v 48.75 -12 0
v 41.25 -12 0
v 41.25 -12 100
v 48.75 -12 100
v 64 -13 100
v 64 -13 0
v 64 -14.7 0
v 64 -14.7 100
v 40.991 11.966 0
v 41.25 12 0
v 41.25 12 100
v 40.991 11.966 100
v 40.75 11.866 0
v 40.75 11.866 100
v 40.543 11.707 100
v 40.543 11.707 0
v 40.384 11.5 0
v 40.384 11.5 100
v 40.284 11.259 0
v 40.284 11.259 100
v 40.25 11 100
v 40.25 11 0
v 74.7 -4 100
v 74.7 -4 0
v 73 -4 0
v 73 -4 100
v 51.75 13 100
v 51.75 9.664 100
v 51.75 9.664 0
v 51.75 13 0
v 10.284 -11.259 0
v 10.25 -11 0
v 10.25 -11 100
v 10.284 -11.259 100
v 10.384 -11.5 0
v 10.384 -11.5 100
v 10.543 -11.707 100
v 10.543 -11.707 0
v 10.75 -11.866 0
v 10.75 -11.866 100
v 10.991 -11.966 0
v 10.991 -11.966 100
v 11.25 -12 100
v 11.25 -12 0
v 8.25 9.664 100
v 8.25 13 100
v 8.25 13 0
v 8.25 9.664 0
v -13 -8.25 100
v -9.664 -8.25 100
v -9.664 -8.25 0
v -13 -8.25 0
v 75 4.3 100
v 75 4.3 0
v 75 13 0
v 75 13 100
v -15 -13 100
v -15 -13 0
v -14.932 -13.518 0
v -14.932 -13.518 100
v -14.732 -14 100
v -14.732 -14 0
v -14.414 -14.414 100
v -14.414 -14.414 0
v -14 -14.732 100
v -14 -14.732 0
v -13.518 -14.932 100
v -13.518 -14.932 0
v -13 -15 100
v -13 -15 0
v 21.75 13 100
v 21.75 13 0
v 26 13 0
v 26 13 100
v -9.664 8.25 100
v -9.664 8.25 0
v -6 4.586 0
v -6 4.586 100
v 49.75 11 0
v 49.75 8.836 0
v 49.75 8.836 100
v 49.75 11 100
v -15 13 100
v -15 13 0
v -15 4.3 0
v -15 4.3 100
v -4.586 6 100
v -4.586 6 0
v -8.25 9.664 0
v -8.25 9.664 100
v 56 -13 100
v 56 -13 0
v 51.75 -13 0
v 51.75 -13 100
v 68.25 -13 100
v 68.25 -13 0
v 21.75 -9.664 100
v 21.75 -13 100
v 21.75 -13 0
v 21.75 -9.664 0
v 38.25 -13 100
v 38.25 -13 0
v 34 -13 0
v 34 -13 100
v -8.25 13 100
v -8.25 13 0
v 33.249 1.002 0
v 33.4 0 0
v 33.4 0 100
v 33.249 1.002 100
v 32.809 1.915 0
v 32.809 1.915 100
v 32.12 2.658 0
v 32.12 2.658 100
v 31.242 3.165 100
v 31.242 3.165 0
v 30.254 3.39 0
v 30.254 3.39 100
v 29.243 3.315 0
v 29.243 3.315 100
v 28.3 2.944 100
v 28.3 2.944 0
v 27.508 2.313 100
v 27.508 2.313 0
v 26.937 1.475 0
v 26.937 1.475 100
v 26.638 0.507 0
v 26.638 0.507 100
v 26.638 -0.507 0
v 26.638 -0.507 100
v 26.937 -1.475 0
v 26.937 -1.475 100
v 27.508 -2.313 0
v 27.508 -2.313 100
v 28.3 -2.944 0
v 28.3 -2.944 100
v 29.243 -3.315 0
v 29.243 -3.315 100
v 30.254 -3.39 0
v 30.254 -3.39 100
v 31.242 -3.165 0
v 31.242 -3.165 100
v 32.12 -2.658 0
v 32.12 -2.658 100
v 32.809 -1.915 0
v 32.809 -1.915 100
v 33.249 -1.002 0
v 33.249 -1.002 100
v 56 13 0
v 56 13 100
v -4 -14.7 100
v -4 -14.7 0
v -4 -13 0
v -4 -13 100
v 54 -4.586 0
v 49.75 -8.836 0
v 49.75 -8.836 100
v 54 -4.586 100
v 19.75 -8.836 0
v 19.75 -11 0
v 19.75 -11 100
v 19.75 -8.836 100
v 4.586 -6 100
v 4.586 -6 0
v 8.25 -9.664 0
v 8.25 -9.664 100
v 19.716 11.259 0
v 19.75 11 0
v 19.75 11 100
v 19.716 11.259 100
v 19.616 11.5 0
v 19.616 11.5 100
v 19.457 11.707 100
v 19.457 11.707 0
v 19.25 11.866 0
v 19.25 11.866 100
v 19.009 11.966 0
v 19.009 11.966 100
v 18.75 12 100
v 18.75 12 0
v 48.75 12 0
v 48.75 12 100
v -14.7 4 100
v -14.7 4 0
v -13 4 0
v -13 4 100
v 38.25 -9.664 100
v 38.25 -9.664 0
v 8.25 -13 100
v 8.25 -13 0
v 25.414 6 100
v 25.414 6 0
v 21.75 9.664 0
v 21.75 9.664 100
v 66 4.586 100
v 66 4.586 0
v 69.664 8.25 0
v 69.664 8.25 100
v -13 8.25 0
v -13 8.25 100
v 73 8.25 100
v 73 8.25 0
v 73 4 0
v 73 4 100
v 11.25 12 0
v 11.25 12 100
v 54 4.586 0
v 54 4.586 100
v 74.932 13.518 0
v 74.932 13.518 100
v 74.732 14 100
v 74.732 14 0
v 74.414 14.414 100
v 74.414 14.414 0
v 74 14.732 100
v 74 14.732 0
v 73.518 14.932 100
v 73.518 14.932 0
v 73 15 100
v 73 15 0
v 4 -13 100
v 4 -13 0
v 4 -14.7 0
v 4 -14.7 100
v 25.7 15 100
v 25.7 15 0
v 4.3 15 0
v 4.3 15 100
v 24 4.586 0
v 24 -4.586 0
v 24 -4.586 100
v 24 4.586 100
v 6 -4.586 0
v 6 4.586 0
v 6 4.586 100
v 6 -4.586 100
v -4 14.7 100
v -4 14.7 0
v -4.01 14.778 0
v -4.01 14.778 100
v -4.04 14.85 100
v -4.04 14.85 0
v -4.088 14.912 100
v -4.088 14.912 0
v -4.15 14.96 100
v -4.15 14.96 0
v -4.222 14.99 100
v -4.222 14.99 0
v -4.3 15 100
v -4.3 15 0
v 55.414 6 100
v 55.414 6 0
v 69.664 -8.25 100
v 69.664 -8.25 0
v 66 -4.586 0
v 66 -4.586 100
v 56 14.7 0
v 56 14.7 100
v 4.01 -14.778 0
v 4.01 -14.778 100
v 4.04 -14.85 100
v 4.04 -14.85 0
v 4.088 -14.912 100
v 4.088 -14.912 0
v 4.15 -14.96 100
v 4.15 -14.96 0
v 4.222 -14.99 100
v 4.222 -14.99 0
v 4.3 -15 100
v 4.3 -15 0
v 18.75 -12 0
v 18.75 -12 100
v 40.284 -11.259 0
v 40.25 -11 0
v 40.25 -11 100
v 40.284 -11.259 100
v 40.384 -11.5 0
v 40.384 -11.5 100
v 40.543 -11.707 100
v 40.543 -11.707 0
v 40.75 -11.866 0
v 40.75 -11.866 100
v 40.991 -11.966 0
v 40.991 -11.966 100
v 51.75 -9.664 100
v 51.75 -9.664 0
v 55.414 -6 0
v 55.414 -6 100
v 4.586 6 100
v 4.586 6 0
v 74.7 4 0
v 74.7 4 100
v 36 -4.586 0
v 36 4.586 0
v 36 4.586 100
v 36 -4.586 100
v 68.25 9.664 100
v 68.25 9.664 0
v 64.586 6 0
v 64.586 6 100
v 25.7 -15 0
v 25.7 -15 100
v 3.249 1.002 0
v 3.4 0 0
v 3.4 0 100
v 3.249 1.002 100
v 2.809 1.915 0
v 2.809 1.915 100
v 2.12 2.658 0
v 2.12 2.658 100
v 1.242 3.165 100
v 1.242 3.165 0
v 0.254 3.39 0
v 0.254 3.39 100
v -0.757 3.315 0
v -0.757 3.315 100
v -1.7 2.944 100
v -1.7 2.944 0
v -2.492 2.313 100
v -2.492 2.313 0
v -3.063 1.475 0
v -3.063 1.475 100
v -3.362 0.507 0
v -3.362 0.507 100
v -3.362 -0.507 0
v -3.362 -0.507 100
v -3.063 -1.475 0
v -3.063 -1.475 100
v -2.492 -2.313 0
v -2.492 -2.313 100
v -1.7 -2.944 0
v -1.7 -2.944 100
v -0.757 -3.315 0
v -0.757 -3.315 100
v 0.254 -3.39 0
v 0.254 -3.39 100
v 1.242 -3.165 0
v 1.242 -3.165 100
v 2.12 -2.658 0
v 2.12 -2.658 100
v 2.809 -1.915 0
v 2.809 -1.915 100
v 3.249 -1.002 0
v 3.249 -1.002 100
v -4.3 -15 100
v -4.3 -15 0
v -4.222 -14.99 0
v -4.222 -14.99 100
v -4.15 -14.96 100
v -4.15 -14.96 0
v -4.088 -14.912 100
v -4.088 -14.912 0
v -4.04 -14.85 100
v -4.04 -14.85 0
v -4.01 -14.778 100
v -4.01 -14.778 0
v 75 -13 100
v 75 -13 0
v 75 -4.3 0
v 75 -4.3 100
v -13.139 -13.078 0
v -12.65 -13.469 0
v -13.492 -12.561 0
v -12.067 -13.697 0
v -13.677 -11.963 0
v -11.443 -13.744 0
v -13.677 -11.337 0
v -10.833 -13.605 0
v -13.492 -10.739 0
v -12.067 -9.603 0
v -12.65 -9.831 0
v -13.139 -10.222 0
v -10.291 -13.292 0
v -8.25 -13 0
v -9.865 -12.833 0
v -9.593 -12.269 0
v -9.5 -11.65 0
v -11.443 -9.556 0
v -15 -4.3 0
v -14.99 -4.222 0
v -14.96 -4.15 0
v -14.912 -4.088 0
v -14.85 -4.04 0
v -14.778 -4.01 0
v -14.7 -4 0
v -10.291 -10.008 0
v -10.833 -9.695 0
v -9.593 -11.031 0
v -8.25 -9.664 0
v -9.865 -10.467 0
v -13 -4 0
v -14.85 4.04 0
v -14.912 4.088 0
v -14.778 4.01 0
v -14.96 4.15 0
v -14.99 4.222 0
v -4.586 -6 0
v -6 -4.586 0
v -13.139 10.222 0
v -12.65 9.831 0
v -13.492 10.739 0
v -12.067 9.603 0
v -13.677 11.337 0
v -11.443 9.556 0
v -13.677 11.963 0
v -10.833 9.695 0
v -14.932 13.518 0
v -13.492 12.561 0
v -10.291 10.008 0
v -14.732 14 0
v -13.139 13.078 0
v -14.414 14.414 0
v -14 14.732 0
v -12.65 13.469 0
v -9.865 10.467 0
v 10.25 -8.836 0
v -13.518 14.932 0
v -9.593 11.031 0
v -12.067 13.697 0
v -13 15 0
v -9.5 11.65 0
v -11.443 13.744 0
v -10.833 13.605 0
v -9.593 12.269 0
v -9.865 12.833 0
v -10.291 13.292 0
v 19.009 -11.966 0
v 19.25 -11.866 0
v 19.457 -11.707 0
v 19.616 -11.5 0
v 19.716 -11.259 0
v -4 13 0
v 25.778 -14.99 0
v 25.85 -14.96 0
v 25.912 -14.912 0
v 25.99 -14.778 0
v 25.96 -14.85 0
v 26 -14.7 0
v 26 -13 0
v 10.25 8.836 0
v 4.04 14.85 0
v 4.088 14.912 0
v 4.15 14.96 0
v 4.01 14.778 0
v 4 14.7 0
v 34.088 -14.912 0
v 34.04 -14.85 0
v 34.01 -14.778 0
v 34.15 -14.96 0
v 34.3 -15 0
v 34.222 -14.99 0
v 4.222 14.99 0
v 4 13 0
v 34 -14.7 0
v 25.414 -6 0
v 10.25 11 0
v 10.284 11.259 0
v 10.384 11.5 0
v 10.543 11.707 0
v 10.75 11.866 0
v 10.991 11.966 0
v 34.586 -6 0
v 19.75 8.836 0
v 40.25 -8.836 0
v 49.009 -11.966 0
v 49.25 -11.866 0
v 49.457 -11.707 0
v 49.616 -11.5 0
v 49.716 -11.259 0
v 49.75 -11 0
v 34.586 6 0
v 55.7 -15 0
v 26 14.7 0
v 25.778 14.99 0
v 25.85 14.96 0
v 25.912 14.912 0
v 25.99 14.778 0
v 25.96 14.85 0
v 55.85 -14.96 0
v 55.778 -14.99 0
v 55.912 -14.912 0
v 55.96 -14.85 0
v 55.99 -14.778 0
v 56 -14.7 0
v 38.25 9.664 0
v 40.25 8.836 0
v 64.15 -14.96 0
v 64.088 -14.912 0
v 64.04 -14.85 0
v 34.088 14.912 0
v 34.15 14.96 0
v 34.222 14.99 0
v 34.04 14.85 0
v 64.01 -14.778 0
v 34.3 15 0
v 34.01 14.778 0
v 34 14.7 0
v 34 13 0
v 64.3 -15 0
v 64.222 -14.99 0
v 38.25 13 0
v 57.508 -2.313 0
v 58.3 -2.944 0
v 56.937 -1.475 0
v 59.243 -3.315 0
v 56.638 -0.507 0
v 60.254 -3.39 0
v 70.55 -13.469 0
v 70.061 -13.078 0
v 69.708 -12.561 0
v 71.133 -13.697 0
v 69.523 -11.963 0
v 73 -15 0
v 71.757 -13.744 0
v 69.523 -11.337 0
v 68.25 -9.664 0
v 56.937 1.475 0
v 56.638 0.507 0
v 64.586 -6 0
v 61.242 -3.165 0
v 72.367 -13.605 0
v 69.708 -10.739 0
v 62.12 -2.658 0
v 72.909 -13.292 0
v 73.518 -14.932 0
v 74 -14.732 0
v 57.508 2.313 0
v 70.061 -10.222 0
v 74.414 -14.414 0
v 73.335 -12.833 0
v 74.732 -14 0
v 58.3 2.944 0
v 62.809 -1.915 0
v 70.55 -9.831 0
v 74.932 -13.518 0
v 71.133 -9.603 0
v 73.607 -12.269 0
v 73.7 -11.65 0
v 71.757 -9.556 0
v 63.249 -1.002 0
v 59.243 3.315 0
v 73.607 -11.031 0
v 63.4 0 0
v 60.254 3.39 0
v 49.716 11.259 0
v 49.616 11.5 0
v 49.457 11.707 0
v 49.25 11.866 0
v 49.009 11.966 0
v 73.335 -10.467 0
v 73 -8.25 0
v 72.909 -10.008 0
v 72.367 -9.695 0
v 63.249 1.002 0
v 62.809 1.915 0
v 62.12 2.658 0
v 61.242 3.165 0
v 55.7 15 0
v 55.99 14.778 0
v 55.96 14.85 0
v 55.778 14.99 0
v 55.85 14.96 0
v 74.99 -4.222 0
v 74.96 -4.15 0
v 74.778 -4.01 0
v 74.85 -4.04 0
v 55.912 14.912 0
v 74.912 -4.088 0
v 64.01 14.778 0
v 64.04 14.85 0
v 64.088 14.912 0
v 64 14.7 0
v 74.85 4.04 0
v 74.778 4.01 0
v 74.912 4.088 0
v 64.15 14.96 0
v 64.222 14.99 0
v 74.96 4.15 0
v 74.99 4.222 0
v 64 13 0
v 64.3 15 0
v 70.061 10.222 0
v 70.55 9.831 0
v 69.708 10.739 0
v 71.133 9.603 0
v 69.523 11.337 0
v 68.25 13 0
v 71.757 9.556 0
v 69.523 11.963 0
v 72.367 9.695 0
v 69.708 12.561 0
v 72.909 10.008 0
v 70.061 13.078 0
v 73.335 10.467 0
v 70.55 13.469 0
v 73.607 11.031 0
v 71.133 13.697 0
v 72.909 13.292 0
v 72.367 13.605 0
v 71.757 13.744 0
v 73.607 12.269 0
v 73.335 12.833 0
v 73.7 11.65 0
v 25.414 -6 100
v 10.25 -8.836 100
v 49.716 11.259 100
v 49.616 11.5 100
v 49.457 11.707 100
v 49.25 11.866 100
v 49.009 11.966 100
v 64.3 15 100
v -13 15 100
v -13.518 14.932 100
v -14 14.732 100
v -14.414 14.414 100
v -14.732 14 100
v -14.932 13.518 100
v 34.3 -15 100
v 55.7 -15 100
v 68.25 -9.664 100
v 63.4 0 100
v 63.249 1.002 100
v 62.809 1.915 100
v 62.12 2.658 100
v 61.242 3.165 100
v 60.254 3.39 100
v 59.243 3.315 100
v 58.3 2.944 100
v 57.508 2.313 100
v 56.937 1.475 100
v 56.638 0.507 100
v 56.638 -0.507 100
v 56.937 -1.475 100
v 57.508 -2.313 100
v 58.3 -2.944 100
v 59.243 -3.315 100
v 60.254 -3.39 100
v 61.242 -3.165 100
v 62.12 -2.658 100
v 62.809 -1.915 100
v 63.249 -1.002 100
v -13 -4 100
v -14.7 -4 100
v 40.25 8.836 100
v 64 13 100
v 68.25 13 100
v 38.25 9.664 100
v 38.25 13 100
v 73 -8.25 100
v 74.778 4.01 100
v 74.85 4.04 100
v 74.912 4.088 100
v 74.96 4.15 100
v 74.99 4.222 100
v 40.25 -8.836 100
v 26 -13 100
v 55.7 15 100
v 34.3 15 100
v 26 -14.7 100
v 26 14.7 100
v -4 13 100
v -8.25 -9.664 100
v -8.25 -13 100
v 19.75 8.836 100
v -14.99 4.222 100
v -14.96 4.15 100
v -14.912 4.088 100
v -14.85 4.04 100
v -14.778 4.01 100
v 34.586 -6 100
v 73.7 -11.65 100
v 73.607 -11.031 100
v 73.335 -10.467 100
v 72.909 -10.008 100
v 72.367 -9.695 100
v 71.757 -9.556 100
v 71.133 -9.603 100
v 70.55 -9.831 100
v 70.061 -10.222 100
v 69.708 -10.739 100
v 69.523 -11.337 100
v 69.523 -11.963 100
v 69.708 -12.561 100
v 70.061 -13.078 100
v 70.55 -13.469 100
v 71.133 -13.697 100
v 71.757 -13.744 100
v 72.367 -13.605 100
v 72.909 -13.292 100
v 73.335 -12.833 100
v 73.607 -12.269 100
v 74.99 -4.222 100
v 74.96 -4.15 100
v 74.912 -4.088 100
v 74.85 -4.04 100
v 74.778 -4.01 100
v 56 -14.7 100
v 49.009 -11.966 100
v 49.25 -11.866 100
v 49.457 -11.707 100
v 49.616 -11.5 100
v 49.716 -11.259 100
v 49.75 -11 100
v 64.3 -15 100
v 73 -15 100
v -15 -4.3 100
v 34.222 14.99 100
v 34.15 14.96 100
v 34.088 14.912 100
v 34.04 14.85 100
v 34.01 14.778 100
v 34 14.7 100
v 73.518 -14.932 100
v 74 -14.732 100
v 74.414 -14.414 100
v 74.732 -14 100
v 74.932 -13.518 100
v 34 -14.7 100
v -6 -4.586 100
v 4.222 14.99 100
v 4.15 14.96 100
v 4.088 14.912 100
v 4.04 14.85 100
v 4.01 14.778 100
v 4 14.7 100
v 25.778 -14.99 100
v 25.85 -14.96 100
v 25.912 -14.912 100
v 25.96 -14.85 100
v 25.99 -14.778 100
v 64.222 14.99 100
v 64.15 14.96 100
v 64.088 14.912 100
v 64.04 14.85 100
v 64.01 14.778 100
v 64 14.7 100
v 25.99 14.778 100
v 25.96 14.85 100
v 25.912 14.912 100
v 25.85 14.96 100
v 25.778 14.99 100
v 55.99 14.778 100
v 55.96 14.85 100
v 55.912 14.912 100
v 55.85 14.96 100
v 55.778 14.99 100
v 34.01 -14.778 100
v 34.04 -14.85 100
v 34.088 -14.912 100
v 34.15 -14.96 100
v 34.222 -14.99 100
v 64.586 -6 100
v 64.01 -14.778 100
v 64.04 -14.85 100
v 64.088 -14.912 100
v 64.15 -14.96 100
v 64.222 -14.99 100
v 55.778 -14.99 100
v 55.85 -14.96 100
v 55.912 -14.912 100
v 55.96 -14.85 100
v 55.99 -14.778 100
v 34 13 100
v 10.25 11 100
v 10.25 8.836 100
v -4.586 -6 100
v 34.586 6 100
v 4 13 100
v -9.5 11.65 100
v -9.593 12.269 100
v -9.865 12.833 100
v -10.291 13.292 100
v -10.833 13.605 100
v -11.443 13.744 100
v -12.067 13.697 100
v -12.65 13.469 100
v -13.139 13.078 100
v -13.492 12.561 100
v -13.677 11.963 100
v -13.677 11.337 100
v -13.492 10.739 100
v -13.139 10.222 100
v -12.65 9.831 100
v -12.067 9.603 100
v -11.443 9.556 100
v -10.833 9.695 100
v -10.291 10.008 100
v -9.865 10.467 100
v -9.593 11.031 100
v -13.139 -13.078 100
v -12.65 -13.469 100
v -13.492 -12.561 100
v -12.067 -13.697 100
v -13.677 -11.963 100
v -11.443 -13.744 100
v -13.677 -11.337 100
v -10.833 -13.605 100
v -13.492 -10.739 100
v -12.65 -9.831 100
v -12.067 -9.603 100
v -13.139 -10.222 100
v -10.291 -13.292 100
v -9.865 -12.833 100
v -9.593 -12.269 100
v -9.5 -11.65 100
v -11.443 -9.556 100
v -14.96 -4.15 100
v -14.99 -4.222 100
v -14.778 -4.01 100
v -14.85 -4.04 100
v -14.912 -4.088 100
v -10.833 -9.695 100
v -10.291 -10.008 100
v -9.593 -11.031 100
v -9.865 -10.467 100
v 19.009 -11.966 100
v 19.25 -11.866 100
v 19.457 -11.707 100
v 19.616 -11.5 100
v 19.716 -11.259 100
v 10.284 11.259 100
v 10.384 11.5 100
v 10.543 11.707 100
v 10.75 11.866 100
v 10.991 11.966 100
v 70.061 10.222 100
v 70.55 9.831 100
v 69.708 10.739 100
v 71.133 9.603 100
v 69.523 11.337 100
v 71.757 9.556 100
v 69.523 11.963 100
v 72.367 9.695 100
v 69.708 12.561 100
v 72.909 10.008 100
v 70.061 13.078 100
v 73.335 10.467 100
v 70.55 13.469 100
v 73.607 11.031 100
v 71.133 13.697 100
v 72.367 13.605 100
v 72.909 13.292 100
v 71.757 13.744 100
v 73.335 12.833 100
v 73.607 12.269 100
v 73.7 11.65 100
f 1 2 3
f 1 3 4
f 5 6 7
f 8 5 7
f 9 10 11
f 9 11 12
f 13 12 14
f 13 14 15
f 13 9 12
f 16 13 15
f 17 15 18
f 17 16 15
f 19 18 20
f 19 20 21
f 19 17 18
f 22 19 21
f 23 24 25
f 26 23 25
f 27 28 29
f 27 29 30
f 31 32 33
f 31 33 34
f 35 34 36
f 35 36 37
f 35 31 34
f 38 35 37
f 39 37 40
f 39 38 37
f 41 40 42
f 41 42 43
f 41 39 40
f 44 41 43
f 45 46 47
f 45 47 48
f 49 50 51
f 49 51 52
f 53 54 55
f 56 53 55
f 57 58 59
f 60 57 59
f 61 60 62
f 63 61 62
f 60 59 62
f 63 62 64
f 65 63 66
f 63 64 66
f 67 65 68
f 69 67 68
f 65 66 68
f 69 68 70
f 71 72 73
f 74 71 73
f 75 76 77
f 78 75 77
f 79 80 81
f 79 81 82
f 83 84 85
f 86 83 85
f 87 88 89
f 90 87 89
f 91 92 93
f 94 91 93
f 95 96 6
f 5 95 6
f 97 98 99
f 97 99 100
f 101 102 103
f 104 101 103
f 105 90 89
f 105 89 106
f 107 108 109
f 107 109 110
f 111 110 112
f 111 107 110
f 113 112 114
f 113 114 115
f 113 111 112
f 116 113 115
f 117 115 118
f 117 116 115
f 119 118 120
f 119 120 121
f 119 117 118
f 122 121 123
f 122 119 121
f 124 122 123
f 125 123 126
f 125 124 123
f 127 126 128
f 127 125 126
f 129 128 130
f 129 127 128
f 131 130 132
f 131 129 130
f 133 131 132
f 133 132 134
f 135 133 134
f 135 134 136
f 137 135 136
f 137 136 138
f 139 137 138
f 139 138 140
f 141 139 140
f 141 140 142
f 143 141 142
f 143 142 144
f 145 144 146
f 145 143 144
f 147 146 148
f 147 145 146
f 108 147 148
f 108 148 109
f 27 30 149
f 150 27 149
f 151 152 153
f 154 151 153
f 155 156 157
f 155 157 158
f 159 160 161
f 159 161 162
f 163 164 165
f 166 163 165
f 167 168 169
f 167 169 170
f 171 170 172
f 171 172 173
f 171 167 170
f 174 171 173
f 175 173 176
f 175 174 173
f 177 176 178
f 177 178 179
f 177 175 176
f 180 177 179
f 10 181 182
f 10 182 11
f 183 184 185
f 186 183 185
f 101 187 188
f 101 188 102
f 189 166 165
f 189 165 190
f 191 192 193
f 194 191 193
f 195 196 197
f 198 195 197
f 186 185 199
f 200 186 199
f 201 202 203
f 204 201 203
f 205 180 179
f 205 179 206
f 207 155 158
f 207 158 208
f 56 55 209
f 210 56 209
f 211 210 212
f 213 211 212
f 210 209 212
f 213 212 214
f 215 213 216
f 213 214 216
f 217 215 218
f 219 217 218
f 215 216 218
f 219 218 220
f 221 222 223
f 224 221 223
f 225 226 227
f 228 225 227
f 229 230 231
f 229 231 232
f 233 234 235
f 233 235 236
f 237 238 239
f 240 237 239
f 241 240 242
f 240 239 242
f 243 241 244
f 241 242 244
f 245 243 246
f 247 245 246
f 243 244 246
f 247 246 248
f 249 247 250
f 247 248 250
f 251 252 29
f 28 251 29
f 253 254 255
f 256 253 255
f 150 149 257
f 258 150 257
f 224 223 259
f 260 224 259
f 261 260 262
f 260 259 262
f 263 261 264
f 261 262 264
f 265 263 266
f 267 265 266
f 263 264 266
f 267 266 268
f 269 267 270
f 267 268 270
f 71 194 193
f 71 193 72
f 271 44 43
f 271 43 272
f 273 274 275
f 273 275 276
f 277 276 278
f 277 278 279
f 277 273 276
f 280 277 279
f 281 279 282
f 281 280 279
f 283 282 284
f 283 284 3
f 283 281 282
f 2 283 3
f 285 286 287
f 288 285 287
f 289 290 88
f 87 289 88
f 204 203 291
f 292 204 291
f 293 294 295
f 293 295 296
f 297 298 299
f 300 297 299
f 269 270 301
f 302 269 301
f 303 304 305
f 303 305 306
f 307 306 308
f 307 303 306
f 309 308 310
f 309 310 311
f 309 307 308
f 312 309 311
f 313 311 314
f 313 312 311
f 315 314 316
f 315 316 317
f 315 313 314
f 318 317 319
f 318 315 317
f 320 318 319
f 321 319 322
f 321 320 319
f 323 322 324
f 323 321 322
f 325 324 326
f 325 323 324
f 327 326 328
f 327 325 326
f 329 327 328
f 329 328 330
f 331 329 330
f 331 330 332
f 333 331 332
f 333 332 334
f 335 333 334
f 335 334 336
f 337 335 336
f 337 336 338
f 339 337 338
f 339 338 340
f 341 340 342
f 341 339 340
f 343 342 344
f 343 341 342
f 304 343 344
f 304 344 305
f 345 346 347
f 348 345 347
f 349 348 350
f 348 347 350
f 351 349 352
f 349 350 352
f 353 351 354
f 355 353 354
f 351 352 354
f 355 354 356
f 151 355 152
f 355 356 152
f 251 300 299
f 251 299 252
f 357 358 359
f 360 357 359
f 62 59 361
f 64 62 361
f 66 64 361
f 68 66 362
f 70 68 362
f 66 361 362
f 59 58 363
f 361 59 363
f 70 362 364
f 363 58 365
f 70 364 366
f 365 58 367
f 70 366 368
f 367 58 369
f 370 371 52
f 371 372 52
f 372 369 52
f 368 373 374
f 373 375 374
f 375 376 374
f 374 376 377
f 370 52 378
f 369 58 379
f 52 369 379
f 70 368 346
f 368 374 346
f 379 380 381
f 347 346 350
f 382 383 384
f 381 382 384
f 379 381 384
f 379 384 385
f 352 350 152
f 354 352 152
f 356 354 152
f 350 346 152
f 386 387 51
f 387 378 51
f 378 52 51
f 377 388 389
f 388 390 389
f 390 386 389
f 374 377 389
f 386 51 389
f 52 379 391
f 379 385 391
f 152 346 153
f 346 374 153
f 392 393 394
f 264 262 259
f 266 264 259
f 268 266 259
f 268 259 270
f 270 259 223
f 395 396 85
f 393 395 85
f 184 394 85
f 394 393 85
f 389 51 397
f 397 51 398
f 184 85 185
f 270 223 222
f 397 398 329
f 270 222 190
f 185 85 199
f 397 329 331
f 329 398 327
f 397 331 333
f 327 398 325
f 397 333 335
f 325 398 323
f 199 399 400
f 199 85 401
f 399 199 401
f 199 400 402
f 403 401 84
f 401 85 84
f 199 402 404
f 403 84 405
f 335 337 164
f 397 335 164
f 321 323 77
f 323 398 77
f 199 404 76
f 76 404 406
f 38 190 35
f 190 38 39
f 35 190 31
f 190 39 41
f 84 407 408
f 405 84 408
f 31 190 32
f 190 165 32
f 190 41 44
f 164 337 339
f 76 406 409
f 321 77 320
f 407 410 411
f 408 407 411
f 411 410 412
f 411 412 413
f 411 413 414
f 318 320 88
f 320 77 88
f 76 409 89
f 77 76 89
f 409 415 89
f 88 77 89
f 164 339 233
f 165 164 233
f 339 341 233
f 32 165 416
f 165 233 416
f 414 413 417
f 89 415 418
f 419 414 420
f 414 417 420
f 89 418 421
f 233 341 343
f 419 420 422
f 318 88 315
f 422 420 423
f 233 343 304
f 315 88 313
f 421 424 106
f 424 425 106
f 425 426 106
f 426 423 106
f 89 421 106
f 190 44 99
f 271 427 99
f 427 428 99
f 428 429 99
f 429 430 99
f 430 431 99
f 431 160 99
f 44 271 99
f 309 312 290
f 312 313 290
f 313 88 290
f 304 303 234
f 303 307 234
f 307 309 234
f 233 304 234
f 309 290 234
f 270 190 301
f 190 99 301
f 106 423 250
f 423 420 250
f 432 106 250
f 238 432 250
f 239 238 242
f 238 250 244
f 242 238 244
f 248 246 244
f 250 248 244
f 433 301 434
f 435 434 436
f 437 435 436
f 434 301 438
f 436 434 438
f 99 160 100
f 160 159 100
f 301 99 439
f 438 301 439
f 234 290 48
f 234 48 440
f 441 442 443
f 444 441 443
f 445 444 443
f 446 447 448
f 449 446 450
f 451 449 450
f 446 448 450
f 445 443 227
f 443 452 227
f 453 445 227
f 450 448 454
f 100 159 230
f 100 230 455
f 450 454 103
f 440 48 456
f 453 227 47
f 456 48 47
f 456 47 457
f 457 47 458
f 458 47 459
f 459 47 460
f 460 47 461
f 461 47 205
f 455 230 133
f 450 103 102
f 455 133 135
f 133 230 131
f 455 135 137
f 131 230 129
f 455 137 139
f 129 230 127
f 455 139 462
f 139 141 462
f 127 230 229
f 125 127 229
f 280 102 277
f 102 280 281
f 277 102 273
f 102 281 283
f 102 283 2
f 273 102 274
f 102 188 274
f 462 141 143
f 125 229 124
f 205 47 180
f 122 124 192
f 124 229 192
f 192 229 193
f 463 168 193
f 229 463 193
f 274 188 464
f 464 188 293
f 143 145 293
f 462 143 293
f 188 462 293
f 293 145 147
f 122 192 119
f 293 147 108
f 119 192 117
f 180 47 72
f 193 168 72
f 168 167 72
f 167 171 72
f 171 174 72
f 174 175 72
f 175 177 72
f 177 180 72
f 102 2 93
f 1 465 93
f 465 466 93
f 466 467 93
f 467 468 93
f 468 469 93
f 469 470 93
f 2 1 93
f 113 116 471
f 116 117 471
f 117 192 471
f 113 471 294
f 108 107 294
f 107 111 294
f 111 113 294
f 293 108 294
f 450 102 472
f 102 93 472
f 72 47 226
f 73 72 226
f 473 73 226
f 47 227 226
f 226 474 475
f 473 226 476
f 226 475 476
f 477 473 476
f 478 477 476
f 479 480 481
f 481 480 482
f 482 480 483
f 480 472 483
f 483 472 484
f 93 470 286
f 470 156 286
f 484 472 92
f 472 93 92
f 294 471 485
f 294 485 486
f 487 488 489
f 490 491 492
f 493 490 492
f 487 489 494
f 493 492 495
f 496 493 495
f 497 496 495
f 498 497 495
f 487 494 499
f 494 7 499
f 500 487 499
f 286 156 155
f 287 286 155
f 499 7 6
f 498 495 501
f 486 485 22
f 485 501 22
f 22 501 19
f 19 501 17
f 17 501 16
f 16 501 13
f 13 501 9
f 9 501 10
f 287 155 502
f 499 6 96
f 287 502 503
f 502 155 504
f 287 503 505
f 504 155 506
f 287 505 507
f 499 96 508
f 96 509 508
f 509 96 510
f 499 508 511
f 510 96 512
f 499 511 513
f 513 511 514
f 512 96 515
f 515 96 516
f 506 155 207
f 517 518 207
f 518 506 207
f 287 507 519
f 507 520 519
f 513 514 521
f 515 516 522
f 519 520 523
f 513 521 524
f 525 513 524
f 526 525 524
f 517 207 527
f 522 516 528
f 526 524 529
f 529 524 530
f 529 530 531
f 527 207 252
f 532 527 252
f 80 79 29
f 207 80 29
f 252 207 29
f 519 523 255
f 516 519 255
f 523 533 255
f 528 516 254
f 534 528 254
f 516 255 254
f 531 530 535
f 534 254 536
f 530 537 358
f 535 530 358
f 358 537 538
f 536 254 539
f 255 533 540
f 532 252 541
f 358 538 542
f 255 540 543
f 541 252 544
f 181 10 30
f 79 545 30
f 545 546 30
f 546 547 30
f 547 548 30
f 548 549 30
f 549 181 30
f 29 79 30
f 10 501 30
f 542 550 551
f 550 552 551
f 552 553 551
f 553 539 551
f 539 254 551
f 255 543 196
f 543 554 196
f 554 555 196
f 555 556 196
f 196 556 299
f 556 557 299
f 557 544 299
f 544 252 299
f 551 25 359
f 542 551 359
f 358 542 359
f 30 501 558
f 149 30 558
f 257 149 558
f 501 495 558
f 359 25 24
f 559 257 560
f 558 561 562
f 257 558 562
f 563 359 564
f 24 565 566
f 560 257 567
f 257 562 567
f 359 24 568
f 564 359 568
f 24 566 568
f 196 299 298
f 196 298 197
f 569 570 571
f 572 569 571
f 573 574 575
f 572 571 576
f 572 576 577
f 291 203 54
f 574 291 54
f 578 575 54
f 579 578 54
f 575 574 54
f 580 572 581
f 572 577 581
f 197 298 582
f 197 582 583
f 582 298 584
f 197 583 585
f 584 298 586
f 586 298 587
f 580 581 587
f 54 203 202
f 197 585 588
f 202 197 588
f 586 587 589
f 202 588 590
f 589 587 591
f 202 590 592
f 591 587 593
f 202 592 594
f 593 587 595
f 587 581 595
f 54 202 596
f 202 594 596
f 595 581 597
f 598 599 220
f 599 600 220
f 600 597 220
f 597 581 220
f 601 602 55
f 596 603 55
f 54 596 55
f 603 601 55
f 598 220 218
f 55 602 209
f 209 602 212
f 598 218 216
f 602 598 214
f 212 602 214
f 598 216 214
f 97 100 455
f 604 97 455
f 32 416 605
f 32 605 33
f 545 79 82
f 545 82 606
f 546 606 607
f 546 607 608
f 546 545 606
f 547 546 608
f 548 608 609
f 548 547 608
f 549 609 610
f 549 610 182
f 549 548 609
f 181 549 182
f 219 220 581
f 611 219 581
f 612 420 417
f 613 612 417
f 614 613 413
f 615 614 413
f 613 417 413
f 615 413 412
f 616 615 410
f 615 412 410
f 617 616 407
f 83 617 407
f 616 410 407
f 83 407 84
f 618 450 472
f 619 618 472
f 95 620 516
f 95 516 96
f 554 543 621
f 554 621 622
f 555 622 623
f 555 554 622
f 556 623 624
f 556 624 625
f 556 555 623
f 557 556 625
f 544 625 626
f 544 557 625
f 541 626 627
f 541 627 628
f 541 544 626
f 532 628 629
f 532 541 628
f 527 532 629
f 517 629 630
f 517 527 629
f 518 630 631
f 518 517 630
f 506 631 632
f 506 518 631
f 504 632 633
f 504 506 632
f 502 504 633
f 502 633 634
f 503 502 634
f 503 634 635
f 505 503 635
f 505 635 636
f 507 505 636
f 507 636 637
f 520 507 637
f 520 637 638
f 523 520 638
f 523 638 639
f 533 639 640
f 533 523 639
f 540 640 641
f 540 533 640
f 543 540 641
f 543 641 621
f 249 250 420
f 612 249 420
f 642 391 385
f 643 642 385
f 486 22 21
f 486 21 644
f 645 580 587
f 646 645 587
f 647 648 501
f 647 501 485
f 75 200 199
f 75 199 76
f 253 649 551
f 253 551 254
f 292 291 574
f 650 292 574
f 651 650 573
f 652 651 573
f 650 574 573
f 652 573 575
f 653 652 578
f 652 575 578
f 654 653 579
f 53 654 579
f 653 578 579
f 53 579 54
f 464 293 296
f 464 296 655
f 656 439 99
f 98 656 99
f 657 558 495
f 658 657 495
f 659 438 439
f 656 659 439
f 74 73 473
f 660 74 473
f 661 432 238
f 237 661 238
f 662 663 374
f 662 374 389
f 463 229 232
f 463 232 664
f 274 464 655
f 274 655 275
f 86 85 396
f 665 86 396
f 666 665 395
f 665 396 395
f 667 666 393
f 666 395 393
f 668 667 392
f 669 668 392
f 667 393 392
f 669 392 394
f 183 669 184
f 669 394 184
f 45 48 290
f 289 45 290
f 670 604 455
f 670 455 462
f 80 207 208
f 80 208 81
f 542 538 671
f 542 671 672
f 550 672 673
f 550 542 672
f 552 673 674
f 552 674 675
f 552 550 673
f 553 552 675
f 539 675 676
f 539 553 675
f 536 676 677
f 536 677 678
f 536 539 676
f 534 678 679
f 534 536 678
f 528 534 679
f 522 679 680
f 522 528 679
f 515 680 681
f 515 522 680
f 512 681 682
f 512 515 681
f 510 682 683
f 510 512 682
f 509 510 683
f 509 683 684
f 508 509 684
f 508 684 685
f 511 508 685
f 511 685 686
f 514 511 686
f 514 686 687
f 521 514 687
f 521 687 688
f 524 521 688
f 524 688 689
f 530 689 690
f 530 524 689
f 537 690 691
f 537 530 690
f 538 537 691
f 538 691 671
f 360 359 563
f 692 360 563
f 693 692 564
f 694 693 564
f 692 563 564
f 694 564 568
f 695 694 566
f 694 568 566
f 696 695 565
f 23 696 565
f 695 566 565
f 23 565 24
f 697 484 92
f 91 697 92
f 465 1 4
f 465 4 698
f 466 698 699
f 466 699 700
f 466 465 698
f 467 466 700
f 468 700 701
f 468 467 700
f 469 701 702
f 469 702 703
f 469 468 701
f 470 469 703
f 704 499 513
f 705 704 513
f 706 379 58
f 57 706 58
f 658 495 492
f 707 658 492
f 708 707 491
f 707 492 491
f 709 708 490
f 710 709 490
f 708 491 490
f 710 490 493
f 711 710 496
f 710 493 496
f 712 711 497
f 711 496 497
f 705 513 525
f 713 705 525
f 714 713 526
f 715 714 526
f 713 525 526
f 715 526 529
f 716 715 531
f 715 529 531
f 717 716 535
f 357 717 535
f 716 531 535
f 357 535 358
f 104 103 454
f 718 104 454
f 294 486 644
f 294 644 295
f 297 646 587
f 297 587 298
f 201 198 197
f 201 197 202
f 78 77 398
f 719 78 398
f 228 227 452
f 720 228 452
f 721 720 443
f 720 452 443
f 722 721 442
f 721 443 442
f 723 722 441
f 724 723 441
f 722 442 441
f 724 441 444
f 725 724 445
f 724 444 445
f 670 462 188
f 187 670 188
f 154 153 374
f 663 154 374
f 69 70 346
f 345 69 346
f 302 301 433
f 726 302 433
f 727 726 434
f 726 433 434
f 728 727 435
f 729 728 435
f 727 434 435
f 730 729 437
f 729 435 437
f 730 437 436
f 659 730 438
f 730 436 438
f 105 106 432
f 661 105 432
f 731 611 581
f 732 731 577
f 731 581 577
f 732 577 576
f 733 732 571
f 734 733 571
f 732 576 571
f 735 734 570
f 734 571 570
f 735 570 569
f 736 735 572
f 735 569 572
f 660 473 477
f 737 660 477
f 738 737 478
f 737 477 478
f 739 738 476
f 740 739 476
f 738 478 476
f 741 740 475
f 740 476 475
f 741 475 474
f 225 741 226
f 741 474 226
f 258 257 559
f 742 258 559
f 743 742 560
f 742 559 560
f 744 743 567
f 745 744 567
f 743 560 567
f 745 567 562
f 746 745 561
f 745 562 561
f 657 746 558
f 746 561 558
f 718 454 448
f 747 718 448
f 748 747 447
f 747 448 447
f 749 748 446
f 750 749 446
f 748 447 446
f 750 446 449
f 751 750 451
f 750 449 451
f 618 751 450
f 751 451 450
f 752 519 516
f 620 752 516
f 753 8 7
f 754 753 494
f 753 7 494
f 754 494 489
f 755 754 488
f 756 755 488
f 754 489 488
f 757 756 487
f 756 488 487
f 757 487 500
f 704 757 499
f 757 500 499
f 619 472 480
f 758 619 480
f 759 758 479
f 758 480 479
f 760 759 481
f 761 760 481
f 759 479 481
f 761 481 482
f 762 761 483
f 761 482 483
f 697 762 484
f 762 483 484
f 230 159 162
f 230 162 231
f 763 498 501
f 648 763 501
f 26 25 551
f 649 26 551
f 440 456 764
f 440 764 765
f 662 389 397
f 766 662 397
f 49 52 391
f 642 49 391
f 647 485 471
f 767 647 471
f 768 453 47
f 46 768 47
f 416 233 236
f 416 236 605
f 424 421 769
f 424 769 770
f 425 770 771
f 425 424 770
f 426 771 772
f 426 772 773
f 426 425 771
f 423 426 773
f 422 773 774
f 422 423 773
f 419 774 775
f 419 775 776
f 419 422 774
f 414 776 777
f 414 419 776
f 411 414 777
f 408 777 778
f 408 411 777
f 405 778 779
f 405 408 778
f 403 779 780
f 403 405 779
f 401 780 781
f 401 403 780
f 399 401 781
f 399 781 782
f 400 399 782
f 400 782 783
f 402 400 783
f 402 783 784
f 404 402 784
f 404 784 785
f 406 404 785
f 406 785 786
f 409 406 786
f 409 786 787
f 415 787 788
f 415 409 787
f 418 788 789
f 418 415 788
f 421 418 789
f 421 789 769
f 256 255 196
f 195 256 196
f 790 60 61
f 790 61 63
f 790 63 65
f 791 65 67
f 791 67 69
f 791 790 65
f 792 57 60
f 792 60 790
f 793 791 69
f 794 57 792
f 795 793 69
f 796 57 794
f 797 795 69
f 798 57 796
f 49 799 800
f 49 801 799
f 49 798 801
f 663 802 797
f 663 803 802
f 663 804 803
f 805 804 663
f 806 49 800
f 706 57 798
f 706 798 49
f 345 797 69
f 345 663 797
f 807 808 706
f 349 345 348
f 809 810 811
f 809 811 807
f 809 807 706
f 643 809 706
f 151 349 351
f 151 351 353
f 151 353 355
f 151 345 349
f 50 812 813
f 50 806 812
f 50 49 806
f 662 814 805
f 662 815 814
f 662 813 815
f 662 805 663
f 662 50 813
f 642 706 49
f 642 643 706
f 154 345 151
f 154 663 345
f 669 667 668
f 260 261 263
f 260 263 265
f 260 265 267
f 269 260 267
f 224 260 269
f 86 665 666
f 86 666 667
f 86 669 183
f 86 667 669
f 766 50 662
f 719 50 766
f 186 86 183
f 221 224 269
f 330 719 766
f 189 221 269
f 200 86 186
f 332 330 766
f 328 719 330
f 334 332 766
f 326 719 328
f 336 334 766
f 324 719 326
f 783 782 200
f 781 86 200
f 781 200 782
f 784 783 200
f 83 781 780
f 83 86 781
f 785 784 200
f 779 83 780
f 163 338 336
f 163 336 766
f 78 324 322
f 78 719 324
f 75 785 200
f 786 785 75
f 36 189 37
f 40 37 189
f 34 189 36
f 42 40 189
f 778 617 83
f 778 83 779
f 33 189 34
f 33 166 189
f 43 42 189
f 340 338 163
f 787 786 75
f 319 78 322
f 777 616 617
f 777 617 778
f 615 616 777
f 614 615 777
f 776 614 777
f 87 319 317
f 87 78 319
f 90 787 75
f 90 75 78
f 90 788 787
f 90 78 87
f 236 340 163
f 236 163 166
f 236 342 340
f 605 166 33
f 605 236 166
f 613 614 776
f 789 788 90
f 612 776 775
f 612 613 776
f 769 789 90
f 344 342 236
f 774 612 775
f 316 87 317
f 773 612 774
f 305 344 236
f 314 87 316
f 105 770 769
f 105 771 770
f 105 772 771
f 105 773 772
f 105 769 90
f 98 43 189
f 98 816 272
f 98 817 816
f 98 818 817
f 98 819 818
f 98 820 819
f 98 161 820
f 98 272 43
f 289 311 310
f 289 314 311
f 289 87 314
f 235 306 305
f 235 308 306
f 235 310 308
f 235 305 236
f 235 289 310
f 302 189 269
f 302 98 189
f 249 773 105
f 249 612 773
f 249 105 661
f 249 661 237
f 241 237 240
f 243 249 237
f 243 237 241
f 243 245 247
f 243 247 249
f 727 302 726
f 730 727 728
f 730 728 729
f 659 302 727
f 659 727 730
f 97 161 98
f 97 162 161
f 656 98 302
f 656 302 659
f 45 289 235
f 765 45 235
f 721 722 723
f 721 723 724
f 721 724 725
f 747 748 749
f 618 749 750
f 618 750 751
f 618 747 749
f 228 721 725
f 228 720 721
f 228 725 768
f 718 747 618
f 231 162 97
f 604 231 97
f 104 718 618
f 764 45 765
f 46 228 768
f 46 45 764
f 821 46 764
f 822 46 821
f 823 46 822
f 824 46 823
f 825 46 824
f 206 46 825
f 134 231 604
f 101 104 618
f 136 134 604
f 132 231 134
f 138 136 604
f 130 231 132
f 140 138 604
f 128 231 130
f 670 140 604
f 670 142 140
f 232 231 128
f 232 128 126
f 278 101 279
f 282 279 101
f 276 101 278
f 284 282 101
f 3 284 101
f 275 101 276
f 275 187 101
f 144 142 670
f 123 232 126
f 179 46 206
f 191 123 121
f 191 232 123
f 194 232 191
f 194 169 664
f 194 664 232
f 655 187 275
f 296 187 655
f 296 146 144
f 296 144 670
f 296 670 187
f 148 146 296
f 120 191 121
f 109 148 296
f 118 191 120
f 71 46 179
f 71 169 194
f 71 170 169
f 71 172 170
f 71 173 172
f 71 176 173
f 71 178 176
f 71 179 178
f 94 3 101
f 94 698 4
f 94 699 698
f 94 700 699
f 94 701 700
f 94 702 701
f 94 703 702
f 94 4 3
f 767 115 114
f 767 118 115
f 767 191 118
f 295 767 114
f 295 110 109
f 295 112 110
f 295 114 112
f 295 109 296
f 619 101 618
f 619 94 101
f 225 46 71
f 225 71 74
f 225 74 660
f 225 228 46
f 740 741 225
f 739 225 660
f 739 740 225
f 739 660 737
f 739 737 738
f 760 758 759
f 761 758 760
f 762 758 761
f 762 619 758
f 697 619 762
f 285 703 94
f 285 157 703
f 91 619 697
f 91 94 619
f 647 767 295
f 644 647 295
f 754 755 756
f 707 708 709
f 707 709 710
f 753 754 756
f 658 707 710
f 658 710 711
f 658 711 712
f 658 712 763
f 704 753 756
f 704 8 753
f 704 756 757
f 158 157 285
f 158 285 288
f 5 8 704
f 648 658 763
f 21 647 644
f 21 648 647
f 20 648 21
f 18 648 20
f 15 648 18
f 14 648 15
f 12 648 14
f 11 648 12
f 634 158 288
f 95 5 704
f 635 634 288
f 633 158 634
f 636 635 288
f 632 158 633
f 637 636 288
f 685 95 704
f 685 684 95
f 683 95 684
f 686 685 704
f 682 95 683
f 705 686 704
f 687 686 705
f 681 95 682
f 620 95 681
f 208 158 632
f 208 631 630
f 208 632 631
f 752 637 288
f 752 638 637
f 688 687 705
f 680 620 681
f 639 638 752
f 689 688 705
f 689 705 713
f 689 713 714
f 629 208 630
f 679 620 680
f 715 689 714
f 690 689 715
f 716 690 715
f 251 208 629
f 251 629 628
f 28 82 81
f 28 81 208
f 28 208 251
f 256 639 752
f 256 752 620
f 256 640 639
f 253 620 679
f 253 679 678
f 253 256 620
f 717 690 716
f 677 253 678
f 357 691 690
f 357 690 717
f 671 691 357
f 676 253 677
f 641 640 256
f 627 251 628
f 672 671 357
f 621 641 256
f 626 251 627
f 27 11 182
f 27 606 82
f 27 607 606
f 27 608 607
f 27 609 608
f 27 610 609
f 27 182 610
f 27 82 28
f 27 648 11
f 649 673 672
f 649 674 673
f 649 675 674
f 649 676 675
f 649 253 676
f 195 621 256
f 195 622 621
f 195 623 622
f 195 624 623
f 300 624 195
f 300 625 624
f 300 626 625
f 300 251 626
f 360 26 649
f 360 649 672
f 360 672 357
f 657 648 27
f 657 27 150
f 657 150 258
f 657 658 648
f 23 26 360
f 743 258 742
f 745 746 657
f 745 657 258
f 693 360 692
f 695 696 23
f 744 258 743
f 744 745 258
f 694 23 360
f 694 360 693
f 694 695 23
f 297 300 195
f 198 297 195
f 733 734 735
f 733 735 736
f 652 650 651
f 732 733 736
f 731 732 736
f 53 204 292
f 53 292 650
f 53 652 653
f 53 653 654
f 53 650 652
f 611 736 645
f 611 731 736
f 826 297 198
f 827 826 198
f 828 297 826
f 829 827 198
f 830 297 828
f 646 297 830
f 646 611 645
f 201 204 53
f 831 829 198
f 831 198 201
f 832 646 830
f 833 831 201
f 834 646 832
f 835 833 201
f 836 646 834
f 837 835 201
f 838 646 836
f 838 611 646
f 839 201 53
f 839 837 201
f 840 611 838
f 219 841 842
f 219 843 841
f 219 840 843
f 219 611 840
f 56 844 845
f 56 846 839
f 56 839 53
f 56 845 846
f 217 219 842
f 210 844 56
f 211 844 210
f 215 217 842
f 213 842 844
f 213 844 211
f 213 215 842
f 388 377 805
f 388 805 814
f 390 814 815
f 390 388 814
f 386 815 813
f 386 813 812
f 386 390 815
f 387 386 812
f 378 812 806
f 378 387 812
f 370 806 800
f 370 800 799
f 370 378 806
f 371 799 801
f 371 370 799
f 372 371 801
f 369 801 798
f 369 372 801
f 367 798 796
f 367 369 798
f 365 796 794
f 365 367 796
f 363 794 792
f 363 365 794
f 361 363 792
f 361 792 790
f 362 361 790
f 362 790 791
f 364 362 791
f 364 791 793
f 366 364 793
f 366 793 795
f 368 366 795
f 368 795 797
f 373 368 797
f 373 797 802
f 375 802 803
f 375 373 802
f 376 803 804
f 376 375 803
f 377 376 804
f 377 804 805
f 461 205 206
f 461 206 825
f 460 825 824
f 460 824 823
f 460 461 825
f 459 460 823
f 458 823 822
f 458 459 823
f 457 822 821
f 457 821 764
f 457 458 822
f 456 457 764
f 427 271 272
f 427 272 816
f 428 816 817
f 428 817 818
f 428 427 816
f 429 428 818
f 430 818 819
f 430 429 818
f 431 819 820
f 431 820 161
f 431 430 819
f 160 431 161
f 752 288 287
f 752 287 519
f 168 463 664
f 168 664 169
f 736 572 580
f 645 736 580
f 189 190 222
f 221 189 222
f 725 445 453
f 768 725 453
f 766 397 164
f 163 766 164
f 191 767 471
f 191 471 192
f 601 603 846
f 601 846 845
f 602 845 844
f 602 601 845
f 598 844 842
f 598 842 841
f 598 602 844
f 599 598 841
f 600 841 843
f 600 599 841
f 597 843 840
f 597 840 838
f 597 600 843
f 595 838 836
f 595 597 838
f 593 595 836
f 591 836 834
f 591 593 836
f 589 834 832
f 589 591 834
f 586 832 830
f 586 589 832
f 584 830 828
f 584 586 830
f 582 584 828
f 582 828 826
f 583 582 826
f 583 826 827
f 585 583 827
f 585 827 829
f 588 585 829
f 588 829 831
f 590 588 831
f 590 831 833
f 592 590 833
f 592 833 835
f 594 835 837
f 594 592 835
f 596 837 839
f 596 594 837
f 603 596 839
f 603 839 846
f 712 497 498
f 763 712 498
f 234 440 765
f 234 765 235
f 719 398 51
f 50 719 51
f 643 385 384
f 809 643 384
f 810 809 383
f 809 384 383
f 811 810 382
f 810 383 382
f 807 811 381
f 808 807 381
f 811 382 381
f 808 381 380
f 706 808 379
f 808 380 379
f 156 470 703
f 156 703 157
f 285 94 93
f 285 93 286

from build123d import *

# Parameters (mm, degrees)
SKETCH_1_R      = 3.4
SKETCH_1_R_2    = 2.1
EXTRUDE_1_DEPTH = 100


with BuildPart() as part:
    # 草图1 → 凸台-拉伸1 (new body)
    with BuildSketch(Plane.XY):
        with BuildLine():
            Line((-15, 13), (-15, 4.3))
            ThreePointArc((-15, 4.3), (-14.912132034, 4.087867966), (-14.7, 4))
            Line((-14.7, 4), (-13, 4))
            Line((-13, 4), (-13, 8.25))
            Line((-13, 8.25), (-9.664213562, 8.25))
            Line((-9.664213562, 8.25), (-6, 4.585786438))
            Line((-6, 4.585786438), (-6, -4.585786438))
            Line((-6, -4.585786438), (-9.664213562, -8.25))
            Line((-9.664213562, -8.25), (-13, -8.25))
            Line((-13, -8.25), (-13, -4))
            Line((-13, -4), (-14.7, -4))
            ThreePointArc((-14.7, -4), (-14.912132034, -4.087867966), (-15, -4.3))
            Line((-15, -4.3), (-15, -13))
            ThreePointArc((-15, -13), (-14.414213562, -14.414213562), (-13, -15))
            Line((-13, -15), (-4.3, -15))
            ThreePointArc((-4.3, -15), (-4.087867966, -14.912132034), (-4, -14.7))
            Line((-4, -14.7), (-4, -13))
            Line((-4, -13), (-8.25, -13))
            Line((-8.25, -13), (-8.25, -9.664213562))
            Line((-8.25, -9.664213562), (-4.585786438, -6))
            Line((-4.585786438, -6), (4.585786438, -6))
            Line((4.585786438, -6), (8.25, -9.664213562))
            Line((8.25, -9.664213562), (8.25, -13))
            Line((8.25, -13), (4, -13))
            Line((4, -13), (4, -14.7))
            ThreePointArc((4, -14.7), (4.087867966, -14.912132034), (4.3, -15))
            Line((4.3, -15), (25.7, -15))
            ThreePointArc((25.7, -15), (25.912132034, -14.912132034), (26, -14.7))
            Line((26, -14.7), (26, -13))
            Line((26, -13), (21.75, -13))
            Line((21.75, -13), (21.75, -9.664213562))
            Line((21.75, -9.664213562), (25.414213562, -6))
            Line((25.414213562, -6), (34.585786438, -6))
            Line((34.585786438, -6), (38.25, -9.664213562))
            Line((38.25, -9.664213562), (38.25, -13))
            Line((38.25, -13), (34, -13))
            Line((34, -13), (34, -14.7))
            ThreePointArc((34, -14.7), (34.087867966, -14.912132034), (34.3, -15))
            Line((34.3, -15), (55.7, -15))
            ThreePointArc((55.7, -15), (55.912132034, -14.912132034), (56, -14.7))
            Line((56, -14.7), (56, -13))
            Line((56, -13), (51.75, -13))
            Line((51.75, -13), (51.75, -9.664213562))
            Line((51.75, -9.664213562), (55.414213562, -6))
            Line((55.414213562, -6), (64.585786438, -6))
            Line((64.585786438, -6), (68.25, -9.664213562))
            Line((68.25, -9.664213562), (68.25, -13))
            Line((68.25, -13), (64, -13))
            Line((64, -13), (64, -14.7))
            ThreePointArc((64, -14.7), (64.087867966, -14.912132034), (64.3, -15))
            Line((64.3, -15), (73, -15))
            ThreePointArc((73, -15), (74.414213562, -14.414213562), (75, -13))
            Line((75, -13), (75, -4.3))
            ThreePointArc((75, -4.3), (74.912132034, -4.087867966), (74.7, -4))
            Line((74.7, -4), (73, -4))
            Line((73, -4), (73, -8.25))
            Line((73, -8.25), (69.664213562, -8.25))
            Line((69.664213562, -8.25), (66, -4.585786438))
            Line((66, -4.585786438), (66, 4.585786438))
            Line((66, 4.585786438), (69.664213562, 8.25))
            Line((69.664213562, 8.25), (73, 8.25))
            Line((73, 8.25), (73, 4))
            Line((73, 4), (74.7, 4))
            ThreePointArc((74.7, 4), (74.912132034, 4.087867966), (75, 4.3))
            Line((75, 4.3), (75, 13))
            ThreePointArc((75, 13), (74.414213562, 14.414213562), (73, 15))
            Line((73, 15), (64.3, 15))
            ThreePointArc((64.3, 15), (64.087867966, 14.912132034), (64, 14.7))
            Line((64, 14.7), (64, 13))
            Line((64, 13), (68.25, 13))
            Line((68.25, 13), (68.25, 9.664213562))
            Line((68.25, 9.664213562), (64.585786438, 6))
            Line((64.585786438, 6), (55.414213562, 6))
            Line((55.414213562, 6), (51.75, 9.664213562))
            Line((51.75, 9.664213562), (51.75, 13))
            Line((51.75, 13), (56, 13))
            Line((56, 13), (56, 14.7))
            ThreePointArc((56, 14.7), (55.912132034, 14.912132034), (55.7, 15))
            Line((55.7, 15), (34.3, 15))
            ThreePointArc((34.3, 15), (34.087867966, 14.912132034), (34, 14.7))
            Line((34, 14.7), (34, 13))
            Line((34, 13), (38.25, 13))
            Line((38.25, 13), (38.25, 9.664213562))
            Line((38.25, 9.664213562), (34.585786438, 6))
            Line((34.585786438, 6), (25.414213562, 6))
            Line((25.414213562, 6), (21.75, 9.664213562))
            Line((21.75, 9.664213562), (21.75, 13))
            Line((21.75, 13), (26, 13))
            Line((26, 13), (26, 14.7))
            ThreePointArc((26, 14.7), (25.912132034, 14.912132034), (25.7, 15))
            Line((25.7, 15), (4.3, 15))
            ThreePointArc((4.3, 15), (4.087867966, 14.912132034), (4, 14.7))
            Line((4, 14.7), (4, 13))
            Line((4, 13), (8.25, 13))
            Line((8.25, 13), (8.25, 9.664213562))
            Line((8.25, 9.664213562), (4.585786438, 6))
            Line((4.585786438, 6), (-4.585786438, 6))
            Line((-4.585786438, 6), (-8.25, 9.664213562))
            Line((-8.25, 9.664213562), (-8.25, 13))
            Line((-8.25, 13), (-4, 13))
            Line((-4, 13), (-4, 14.7))
            ThreePointArc((-4, 14.7), (-4.087867966, 14.912132034), (-4.3, 15))
            Line((-4.3, 15), (-13, 15))
            ThreePointArc((-13, 15), (-14.414213562, 14.414213562), (-15, 13))
        make_face()
        Circle(SKETCH_1_R, mode=Mode.SUBTRACT)
        with Locations((60, 0)):
            Circle(SKETCH_1_R, mode=Mode.SUBTRACT)
        with Locations((30, 0)):
            Circle(SKETCH_1_R, mode=Mode.SUBTRACT)
        with Locations((-11.6, -11.65)):
            Circle(SKETCH_1_R_2, mode=Mode.SUBTRACT)
        with Locations((71.6, -11.65)):
            Circle(SKETCH_1_R_2, mode=Mode.SUBTRACT)
        with Locations((71.6, 11.65)):
            Circle(SKETCH_1_R_2, mode=Mode.SUBTRACT)
        with Locations((-11.6, 11.65)):
            Circle(SKETCH_1_R_2, mode=Mode.SUBTRACT)
        with BuildLine():
            Line((40.25, 11), (40.25, 10))
            Line((40.25, 10), (40.25, 8.835786438))
            Line((40.25, 8.835786438), (36, 4.585786438))
            Line((36, 4.585786438), (36, -4.585786438))
            Line((36, -4.585786438), (40.25, -8.835786438))
            Line((40.25, -8.835786438), (40.25, -10))
            Line((40.25, -10), (40.25, -11))
            ThreePointArc((40.25, -11), (40.542893219, -11.707106781), (41.25, -12))
            Line((41.25, -12), (48.75, -12))
            ThreePointArc((48.75, -12), (49.457106781, -11.707106781), (49.75, -11))
            Line((49.75, -11), (49.75, -10))
            Line((49.75, -10), (49.75, -8.835786438))
            Line((49.75, -8.835786438), (54, -4.585786438))
            Line((54, -4.585786438), (54, 4.585786438))
            Line((54, 4.585786438), (49.75, 8.835786438))
            Line((49.75, 8.835786438), (49.75, 10))
            Line((49.75, 10), (49.75, 11))
            ThreePointArc((49.75, 11), (49.457106781, 11.707106781), (48.75, 12))
            Line((48.75, 12), (41.25, 12))
            ThreePointArc((41.25, 12), (40.542893219, 11.707106781), (40.25, 11))
        make_face(mode=Mode.SUBTRACT)
        with BuildLine():
            Line((18.75, 12), (11.25, 12))
            ThreePointArc((11.25, 12), (10.542893219, 11.707106781), (10.25, 11))
            Line((10.25, 11), (10.25, 10))
            Line((10.25, 10), (10.25, 8.835786438))
            Line((10.25, 8.835786438), (6, 4.585786438))
            Line((6, 4.585786438), (6, -4.585786438))
            Line((6, -4.585786438), (10.25, -8.835786438))
            Line((10.25, -8.835786438), (10.25, -10))
            Line((10.25, -10), (10.25, -11))
            ThreePointArc((10.25, -11), (10.542893219, -11.707106781), (11.25, -12))
            Line((11.25, -12), (18.75, -12))
            ThreePointArc((18.75, -12), (19.457106781, -11.707106781), (19.75, -11))
            Line((19.75, -11), (19.75, -10))
            Line((19.75, -10), (19.75, -8.835786438))
            Line((19.75, -8.835786438), (24, -4.585786438))
            Line((24, -4.585786438), (24, 4.585786438))
            Line((24, 4.585786438), (19.75, 8.835786438))
            Line((19.75, 8.835786438), (19.75, 10))
            Line((19.75, 10), (19.75, 11))
            ThreePointArc((19.75, 11), (19.457106781, 11.707106781), (18.75, 12))
        make_face(mode=Mode.SUBTRACT)
    extrude(amount=EXTRUDE_1_DEPTH)


solid = part.part
